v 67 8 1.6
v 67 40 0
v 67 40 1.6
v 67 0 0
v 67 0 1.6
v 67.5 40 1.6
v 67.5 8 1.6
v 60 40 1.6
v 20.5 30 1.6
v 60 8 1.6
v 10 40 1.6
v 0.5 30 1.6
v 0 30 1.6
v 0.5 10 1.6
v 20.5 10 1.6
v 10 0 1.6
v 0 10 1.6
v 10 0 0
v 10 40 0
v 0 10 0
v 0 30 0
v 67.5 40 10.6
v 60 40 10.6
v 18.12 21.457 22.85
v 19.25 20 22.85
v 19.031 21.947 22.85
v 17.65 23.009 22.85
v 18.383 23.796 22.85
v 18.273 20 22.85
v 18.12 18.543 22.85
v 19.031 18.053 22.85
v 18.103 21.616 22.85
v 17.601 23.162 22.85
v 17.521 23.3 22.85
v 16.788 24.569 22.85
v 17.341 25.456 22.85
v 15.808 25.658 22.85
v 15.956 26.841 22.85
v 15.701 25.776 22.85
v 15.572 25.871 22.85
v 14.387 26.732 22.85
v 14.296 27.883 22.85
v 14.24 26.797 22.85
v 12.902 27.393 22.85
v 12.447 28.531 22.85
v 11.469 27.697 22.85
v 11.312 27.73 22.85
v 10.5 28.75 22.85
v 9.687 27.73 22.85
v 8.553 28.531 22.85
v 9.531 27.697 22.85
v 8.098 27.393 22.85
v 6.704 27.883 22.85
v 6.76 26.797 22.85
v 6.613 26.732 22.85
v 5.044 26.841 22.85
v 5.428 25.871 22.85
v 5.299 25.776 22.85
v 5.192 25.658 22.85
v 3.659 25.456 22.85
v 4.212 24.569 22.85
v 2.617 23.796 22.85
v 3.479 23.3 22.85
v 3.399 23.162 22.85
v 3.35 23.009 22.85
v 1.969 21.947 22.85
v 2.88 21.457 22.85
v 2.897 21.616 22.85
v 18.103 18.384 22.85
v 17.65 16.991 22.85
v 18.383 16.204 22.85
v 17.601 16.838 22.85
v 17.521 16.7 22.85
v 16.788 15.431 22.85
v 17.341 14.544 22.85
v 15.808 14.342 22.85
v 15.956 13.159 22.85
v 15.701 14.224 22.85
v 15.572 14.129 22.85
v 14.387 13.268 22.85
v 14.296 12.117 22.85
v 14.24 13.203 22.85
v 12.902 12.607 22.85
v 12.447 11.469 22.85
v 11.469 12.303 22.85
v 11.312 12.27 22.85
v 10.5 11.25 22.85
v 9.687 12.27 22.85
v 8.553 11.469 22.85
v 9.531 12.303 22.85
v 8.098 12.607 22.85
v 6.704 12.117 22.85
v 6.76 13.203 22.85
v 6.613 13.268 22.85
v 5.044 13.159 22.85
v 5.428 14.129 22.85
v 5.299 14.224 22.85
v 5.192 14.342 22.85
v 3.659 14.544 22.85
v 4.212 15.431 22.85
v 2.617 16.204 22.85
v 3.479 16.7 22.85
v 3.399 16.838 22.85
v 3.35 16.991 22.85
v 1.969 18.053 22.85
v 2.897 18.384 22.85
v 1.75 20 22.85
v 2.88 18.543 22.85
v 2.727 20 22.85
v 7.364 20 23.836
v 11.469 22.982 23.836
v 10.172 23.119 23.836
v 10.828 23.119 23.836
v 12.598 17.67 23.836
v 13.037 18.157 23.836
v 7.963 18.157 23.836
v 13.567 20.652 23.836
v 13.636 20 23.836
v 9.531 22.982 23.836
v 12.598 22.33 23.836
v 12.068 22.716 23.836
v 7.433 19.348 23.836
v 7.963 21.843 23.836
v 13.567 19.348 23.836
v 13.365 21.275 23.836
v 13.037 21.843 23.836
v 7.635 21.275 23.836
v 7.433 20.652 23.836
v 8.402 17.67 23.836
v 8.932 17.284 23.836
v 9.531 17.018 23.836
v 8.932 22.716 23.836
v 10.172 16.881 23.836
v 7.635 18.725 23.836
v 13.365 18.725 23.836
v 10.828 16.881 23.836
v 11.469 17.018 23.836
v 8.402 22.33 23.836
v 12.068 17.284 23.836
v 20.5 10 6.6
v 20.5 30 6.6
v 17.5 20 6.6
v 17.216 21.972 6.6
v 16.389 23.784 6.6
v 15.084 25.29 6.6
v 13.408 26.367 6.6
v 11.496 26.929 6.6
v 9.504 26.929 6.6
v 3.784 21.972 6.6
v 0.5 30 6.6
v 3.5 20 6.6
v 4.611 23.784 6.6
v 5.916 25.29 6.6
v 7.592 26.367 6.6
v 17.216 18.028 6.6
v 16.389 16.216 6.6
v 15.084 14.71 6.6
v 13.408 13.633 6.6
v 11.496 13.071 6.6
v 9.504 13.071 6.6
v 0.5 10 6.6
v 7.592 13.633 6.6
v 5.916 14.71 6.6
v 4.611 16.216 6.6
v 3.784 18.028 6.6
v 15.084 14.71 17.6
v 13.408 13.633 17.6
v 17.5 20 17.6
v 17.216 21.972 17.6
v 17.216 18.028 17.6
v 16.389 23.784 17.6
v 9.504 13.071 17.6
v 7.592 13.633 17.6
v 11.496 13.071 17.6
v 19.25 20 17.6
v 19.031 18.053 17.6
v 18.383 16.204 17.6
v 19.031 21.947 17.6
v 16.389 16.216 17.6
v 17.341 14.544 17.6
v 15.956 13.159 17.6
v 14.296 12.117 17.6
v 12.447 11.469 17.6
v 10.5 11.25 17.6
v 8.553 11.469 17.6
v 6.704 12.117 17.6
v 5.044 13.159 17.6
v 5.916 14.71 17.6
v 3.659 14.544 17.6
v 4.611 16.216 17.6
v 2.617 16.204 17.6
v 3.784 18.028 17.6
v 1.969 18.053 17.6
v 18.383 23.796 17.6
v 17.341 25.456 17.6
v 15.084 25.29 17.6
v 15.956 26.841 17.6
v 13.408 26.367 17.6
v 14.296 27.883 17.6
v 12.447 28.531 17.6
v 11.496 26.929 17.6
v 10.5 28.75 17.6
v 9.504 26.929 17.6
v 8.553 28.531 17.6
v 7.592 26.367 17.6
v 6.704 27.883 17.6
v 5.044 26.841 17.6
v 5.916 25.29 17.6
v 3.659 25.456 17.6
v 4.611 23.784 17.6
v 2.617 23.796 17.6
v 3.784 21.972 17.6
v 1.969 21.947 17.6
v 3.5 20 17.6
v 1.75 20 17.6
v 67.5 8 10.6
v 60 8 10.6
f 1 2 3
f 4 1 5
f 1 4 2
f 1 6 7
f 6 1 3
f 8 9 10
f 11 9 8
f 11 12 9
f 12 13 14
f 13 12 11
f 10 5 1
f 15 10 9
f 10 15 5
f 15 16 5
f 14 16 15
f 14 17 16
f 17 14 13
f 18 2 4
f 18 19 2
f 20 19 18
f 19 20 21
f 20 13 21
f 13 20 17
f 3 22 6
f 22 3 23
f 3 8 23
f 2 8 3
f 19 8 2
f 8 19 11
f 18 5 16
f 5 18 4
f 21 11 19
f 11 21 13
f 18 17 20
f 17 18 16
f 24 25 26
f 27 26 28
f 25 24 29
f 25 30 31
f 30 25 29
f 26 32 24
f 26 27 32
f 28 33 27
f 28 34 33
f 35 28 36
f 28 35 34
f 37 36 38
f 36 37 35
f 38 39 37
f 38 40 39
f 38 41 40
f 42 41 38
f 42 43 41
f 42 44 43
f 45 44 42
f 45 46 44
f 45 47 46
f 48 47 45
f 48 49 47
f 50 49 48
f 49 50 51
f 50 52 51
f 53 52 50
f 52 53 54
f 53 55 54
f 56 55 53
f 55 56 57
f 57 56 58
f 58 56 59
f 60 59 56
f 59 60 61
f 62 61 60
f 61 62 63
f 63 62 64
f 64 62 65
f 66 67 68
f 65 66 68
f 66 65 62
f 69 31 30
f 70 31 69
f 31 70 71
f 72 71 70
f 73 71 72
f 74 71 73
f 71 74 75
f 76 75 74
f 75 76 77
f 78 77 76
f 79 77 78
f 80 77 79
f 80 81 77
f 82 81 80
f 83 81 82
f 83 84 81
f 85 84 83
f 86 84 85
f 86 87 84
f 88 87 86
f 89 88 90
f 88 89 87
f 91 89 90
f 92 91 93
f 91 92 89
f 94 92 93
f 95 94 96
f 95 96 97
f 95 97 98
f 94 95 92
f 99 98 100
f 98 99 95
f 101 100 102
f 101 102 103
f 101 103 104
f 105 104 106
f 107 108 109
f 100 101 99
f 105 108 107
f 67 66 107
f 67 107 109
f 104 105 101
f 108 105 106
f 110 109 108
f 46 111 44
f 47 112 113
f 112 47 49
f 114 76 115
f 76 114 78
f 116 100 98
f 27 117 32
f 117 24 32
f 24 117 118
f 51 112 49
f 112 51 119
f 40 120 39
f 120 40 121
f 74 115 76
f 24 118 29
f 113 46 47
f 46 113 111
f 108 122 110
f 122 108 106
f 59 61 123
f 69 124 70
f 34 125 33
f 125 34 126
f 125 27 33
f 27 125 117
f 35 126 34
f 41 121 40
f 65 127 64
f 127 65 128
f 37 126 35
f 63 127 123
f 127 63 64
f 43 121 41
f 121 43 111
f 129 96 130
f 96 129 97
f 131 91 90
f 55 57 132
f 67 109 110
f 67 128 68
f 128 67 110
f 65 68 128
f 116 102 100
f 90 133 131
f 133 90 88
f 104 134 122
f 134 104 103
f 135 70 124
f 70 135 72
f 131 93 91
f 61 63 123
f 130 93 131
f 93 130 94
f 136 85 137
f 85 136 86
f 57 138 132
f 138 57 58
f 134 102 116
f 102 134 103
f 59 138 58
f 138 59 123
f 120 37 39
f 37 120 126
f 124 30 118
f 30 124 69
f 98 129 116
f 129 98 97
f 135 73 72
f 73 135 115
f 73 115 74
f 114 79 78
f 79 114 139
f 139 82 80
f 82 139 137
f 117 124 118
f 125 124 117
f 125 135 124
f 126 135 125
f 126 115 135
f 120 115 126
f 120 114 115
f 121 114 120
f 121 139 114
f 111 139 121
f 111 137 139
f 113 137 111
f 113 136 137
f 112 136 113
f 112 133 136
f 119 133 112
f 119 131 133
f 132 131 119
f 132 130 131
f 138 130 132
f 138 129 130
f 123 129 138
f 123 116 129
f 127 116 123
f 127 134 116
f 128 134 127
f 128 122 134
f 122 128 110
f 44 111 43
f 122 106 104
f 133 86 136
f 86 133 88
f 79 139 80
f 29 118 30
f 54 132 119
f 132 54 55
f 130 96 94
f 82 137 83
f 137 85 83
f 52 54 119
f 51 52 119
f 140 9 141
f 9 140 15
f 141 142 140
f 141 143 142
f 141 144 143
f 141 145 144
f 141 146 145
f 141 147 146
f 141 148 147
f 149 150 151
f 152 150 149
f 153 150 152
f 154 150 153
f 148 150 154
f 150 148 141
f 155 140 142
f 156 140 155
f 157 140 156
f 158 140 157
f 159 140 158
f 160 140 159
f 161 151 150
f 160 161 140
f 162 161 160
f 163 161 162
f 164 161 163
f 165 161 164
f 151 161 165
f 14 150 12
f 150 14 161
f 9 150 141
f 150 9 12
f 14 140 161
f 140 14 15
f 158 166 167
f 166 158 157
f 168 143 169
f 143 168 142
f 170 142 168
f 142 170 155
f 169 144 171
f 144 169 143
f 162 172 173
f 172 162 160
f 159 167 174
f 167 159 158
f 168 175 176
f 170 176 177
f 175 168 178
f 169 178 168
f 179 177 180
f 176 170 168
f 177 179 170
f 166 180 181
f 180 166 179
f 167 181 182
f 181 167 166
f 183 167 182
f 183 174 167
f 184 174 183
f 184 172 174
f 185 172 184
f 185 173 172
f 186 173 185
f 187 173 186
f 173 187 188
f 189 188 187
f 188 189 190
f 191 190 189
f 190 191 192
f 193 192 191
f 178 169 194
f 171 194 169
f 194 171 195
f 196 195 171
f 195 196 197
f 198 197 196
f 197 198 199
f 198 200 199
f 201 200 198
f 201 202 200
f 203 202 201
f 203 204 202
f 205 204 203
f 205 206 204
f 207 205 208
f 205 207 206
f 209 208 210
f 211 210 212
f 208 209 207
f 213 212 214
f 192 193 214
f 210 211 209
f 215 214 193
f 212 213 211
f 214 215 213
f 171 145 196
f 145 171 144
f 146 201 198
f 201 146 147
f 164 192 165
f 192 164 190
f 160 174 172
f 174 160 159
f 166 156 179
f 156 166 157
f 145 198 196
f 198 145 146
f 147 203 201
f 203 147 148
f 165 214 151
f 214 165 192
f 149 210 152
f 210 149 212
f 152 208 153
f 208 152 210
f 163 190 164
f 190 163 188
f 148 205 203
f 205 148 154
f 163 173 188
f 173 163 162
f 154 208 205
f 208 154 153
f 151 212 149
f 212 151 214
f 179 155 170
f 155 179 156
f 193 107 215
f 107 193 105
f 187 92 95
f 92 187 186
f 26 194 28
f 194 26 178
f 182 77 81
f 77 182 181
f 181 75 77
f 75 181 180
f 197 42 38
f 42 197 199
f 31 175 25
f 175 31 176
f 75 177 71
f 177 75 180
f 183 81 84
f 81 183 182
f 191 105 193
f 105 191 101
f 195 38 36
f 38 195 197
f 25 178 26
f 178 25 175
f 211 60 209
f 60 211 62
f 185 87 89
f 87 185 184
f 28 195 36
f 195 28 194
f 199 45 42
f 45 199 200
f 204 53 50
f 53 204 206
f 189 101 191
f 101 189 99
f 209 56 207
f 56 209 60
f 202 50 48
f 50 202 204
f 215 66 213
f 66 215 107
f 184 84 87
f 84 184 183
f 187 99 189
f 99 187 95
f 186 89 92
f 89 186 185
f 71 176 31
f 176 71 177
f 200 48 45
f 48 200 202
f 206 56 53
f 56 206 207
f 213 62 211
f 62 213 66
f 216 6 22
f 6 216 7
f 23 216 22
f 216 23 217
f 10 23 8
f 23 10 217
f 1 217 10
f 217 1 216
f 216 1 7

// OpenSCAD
/*
 * Hack HS
 *
 * Copyright 2012 b@Zi.iS
 *
 * License CC BY 3.0
 */

hack_hd();

module hack_hd() {

	// PCB
	color([0,.75,0]) {
		difference() {
			cube([
				67,
				40,
				1.6
			]);
			
			translate([
				0,
				30,
				-1
			]) {
				rotate([
					0,
					0,
					45
				]) {
					cube([
						67,
						40,
						3
					]);
				}
			}
			
			translate([
				10,
				0,
				-1
			]) {
				rotate([
					0,
					0,
					180-45
				]) {
					cube([
						67,
						40,
						3
					]);
				}
			}

		}
	}

	//Camera
	color([0,0,0]) {
		translate([
			.5,
			10,
			1.6
		]) {
			cube([
				20,
				20,
				5
			]);
		}
	}

	color([0,0,0]) {
		translate([
			.5+10,
			10+10,
			1.6+5
		]) {
			cylinder(
				r=7,
				h=11
			);
		}
	}

	color([0,0,0]) {
		translate([
			.5+10,
			10+10,
			1.6+5+11
		]) {
			cylinder(
				r=17.5/2,
				h=5.25
			);
		}
	}

	//Lense
	color([1,1,1,.5]) {
		intersection() {
			translate([
				.5+10,
				10+10,
				1.6+5+11+5.25
			]) {
				cylinder(
					r=17.5/2,
					h=5.25
				);
			}
			translate([
				.5+10,
				10+10,
				-6
			]) {
				sphere(
					r=30
				);
			}
		}
	}

	//Terminals
	color([0,1,0]) {
		translate([
			60,
			8,
			1.6
		]) {
			cube([
				7.5,
				32,
				9
			]);
		}
	}
}
